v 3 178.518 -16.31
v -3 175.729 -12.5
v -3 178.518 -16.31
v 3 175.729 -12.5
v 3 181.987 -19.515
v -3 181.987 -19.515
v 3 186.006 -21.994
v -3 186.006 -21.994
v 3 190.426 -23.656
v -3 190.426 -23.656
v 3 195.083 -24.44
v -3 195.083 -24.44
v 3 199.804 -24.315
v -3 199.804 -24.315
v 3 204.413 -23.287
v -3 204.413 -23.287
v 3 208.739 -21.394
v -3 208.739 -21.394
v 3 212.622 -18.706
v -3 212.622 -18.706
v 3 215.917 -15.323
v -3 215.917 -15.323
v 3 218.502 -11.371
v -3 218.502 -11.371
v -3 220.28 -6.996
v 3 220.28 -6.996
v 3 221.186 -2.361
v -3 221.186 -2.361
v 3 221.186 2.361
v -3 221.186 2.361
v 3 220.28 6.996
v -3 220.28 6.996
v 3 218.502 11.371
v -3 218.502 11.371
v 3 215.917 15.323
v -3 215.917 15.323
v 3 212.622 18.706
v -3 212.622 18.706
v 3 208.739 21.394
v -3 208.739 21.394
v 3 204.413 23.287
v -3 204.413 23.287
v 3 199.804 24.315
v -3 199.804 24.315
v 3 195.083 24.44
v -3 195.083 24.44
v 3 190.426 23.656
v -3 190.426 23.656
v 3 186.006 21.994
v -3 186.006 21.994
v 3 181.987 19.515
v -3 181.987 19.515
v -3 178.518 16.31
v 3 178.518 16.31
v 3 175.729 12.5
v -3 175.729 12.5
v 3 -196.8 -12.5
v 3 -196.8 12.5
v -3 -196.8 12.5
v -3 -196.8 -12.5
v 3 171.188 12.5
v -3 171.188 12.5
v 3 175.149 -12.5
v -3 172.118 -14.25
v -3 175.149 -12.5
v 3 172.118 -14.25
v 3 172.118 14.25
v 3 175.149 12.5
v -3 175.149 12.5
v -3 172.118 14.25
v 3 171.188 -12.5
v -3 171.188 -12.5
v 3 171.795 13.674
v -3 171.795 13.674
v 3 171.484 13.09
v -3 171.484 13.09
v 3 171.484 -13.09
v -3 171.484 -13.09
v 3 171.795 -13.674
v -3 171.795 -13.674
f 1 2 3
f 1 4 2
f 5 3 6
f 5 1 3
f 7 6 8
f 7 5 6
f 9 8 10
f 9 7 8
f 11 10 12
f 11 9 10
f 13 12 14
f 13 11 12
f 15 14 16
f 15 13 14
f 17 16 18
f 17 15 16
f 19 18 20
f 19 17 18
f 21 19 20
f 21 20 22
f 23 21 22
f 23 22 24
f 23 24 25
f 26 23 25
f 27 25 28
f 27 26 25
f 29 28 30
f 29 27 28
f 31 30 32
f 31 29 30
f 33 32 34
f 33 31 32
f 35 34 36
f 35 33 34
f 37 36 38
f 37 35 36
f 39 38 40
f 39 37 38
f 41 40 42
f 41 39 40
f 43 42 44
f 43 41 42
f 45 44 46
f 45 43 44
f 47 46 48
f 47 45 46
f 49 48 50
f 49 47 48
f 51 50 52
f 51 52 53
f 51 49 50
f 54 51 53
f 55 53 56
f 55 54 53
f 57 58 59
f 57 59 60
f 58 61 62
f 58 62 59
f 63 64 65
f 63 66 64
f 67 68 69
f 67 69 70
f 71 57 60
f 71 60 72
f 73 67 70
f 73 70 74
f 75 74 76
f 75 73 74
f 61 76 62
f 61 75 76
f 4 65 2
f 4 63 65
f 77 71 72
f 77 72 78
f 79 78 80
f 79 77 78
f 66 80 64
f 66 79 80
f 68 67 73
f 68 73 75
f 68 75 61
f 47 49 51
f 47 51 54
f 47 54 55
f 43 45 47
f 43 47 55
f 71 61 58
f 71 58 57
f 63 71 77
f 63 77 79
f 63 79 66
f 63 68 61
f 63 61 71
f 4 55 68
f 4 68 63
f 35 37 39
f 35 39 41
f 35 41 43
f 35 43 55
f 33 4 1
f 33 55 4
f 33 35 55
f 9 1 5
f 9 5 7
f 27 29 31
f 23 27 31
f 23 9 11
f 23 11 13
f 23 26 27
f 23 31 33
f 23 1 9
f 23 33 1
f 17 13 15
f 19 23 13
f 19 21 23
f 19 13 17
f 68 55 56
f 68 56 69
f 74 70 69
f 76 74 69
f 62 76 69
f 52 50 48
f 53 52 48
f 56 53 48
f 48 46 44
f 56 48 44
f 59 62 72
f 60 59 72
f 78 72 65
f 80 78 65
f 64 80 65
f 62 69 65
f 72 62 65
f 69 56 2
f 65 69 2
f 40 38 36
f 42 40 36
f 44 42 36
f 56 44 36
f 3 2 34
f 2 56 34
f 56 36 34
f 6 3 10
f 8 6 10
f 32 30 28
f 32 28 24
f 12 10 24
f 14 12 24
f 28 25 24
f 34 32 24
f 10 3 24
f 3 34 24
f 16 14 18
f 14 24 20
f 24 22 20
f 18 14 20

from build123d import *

# Parameters (mm, degrees)
BOSS_EXTRUDE1_DEPTH = 3


with BuildPart() as part:
    # Sketch1 → Boss-Extrude1 (new body, symmetric)
    with BuildSketch(Plane(origin=(0, 0, 0), x_dir=(0, 0, -1), z_dir=(1, 0, 0))):
        with BuildLine():
            ThreePointArc((12.5, 175.728692494), (0, 221.3), (-12.5, 175.728692494))
            Line((-12.5, 175.728692494), (-12.5, 175.149364905))
            Line((-12.5, 175.149364905), (-14.25, 172.118275992))
            ThreePointArc((-14.25, 172.118275992), (-13.38309417, 171.637671204), (-12.5, 171.18750305))
            Line((-12.5, 171.18750305), (-12.5, -196.8))
            Line((-12.5, -196.8), (12.5, -196.8))
            Line((12.5, -196.8), (12.5, 171.18750305))
            ThreePointArc((12.5, 171.18750305), (13.38309417, 171.637671204), (14.25, 172.118275992))
            Line((14.25, 172.118275992), (12.5, 175.149364905))
            Line((12.5, 175.149364905), (12.5, 175.728692494))
        make_face()
    extrude(amount=BOSS_EXTRUDE1_DEPTH, both=True)


solid = part.part
